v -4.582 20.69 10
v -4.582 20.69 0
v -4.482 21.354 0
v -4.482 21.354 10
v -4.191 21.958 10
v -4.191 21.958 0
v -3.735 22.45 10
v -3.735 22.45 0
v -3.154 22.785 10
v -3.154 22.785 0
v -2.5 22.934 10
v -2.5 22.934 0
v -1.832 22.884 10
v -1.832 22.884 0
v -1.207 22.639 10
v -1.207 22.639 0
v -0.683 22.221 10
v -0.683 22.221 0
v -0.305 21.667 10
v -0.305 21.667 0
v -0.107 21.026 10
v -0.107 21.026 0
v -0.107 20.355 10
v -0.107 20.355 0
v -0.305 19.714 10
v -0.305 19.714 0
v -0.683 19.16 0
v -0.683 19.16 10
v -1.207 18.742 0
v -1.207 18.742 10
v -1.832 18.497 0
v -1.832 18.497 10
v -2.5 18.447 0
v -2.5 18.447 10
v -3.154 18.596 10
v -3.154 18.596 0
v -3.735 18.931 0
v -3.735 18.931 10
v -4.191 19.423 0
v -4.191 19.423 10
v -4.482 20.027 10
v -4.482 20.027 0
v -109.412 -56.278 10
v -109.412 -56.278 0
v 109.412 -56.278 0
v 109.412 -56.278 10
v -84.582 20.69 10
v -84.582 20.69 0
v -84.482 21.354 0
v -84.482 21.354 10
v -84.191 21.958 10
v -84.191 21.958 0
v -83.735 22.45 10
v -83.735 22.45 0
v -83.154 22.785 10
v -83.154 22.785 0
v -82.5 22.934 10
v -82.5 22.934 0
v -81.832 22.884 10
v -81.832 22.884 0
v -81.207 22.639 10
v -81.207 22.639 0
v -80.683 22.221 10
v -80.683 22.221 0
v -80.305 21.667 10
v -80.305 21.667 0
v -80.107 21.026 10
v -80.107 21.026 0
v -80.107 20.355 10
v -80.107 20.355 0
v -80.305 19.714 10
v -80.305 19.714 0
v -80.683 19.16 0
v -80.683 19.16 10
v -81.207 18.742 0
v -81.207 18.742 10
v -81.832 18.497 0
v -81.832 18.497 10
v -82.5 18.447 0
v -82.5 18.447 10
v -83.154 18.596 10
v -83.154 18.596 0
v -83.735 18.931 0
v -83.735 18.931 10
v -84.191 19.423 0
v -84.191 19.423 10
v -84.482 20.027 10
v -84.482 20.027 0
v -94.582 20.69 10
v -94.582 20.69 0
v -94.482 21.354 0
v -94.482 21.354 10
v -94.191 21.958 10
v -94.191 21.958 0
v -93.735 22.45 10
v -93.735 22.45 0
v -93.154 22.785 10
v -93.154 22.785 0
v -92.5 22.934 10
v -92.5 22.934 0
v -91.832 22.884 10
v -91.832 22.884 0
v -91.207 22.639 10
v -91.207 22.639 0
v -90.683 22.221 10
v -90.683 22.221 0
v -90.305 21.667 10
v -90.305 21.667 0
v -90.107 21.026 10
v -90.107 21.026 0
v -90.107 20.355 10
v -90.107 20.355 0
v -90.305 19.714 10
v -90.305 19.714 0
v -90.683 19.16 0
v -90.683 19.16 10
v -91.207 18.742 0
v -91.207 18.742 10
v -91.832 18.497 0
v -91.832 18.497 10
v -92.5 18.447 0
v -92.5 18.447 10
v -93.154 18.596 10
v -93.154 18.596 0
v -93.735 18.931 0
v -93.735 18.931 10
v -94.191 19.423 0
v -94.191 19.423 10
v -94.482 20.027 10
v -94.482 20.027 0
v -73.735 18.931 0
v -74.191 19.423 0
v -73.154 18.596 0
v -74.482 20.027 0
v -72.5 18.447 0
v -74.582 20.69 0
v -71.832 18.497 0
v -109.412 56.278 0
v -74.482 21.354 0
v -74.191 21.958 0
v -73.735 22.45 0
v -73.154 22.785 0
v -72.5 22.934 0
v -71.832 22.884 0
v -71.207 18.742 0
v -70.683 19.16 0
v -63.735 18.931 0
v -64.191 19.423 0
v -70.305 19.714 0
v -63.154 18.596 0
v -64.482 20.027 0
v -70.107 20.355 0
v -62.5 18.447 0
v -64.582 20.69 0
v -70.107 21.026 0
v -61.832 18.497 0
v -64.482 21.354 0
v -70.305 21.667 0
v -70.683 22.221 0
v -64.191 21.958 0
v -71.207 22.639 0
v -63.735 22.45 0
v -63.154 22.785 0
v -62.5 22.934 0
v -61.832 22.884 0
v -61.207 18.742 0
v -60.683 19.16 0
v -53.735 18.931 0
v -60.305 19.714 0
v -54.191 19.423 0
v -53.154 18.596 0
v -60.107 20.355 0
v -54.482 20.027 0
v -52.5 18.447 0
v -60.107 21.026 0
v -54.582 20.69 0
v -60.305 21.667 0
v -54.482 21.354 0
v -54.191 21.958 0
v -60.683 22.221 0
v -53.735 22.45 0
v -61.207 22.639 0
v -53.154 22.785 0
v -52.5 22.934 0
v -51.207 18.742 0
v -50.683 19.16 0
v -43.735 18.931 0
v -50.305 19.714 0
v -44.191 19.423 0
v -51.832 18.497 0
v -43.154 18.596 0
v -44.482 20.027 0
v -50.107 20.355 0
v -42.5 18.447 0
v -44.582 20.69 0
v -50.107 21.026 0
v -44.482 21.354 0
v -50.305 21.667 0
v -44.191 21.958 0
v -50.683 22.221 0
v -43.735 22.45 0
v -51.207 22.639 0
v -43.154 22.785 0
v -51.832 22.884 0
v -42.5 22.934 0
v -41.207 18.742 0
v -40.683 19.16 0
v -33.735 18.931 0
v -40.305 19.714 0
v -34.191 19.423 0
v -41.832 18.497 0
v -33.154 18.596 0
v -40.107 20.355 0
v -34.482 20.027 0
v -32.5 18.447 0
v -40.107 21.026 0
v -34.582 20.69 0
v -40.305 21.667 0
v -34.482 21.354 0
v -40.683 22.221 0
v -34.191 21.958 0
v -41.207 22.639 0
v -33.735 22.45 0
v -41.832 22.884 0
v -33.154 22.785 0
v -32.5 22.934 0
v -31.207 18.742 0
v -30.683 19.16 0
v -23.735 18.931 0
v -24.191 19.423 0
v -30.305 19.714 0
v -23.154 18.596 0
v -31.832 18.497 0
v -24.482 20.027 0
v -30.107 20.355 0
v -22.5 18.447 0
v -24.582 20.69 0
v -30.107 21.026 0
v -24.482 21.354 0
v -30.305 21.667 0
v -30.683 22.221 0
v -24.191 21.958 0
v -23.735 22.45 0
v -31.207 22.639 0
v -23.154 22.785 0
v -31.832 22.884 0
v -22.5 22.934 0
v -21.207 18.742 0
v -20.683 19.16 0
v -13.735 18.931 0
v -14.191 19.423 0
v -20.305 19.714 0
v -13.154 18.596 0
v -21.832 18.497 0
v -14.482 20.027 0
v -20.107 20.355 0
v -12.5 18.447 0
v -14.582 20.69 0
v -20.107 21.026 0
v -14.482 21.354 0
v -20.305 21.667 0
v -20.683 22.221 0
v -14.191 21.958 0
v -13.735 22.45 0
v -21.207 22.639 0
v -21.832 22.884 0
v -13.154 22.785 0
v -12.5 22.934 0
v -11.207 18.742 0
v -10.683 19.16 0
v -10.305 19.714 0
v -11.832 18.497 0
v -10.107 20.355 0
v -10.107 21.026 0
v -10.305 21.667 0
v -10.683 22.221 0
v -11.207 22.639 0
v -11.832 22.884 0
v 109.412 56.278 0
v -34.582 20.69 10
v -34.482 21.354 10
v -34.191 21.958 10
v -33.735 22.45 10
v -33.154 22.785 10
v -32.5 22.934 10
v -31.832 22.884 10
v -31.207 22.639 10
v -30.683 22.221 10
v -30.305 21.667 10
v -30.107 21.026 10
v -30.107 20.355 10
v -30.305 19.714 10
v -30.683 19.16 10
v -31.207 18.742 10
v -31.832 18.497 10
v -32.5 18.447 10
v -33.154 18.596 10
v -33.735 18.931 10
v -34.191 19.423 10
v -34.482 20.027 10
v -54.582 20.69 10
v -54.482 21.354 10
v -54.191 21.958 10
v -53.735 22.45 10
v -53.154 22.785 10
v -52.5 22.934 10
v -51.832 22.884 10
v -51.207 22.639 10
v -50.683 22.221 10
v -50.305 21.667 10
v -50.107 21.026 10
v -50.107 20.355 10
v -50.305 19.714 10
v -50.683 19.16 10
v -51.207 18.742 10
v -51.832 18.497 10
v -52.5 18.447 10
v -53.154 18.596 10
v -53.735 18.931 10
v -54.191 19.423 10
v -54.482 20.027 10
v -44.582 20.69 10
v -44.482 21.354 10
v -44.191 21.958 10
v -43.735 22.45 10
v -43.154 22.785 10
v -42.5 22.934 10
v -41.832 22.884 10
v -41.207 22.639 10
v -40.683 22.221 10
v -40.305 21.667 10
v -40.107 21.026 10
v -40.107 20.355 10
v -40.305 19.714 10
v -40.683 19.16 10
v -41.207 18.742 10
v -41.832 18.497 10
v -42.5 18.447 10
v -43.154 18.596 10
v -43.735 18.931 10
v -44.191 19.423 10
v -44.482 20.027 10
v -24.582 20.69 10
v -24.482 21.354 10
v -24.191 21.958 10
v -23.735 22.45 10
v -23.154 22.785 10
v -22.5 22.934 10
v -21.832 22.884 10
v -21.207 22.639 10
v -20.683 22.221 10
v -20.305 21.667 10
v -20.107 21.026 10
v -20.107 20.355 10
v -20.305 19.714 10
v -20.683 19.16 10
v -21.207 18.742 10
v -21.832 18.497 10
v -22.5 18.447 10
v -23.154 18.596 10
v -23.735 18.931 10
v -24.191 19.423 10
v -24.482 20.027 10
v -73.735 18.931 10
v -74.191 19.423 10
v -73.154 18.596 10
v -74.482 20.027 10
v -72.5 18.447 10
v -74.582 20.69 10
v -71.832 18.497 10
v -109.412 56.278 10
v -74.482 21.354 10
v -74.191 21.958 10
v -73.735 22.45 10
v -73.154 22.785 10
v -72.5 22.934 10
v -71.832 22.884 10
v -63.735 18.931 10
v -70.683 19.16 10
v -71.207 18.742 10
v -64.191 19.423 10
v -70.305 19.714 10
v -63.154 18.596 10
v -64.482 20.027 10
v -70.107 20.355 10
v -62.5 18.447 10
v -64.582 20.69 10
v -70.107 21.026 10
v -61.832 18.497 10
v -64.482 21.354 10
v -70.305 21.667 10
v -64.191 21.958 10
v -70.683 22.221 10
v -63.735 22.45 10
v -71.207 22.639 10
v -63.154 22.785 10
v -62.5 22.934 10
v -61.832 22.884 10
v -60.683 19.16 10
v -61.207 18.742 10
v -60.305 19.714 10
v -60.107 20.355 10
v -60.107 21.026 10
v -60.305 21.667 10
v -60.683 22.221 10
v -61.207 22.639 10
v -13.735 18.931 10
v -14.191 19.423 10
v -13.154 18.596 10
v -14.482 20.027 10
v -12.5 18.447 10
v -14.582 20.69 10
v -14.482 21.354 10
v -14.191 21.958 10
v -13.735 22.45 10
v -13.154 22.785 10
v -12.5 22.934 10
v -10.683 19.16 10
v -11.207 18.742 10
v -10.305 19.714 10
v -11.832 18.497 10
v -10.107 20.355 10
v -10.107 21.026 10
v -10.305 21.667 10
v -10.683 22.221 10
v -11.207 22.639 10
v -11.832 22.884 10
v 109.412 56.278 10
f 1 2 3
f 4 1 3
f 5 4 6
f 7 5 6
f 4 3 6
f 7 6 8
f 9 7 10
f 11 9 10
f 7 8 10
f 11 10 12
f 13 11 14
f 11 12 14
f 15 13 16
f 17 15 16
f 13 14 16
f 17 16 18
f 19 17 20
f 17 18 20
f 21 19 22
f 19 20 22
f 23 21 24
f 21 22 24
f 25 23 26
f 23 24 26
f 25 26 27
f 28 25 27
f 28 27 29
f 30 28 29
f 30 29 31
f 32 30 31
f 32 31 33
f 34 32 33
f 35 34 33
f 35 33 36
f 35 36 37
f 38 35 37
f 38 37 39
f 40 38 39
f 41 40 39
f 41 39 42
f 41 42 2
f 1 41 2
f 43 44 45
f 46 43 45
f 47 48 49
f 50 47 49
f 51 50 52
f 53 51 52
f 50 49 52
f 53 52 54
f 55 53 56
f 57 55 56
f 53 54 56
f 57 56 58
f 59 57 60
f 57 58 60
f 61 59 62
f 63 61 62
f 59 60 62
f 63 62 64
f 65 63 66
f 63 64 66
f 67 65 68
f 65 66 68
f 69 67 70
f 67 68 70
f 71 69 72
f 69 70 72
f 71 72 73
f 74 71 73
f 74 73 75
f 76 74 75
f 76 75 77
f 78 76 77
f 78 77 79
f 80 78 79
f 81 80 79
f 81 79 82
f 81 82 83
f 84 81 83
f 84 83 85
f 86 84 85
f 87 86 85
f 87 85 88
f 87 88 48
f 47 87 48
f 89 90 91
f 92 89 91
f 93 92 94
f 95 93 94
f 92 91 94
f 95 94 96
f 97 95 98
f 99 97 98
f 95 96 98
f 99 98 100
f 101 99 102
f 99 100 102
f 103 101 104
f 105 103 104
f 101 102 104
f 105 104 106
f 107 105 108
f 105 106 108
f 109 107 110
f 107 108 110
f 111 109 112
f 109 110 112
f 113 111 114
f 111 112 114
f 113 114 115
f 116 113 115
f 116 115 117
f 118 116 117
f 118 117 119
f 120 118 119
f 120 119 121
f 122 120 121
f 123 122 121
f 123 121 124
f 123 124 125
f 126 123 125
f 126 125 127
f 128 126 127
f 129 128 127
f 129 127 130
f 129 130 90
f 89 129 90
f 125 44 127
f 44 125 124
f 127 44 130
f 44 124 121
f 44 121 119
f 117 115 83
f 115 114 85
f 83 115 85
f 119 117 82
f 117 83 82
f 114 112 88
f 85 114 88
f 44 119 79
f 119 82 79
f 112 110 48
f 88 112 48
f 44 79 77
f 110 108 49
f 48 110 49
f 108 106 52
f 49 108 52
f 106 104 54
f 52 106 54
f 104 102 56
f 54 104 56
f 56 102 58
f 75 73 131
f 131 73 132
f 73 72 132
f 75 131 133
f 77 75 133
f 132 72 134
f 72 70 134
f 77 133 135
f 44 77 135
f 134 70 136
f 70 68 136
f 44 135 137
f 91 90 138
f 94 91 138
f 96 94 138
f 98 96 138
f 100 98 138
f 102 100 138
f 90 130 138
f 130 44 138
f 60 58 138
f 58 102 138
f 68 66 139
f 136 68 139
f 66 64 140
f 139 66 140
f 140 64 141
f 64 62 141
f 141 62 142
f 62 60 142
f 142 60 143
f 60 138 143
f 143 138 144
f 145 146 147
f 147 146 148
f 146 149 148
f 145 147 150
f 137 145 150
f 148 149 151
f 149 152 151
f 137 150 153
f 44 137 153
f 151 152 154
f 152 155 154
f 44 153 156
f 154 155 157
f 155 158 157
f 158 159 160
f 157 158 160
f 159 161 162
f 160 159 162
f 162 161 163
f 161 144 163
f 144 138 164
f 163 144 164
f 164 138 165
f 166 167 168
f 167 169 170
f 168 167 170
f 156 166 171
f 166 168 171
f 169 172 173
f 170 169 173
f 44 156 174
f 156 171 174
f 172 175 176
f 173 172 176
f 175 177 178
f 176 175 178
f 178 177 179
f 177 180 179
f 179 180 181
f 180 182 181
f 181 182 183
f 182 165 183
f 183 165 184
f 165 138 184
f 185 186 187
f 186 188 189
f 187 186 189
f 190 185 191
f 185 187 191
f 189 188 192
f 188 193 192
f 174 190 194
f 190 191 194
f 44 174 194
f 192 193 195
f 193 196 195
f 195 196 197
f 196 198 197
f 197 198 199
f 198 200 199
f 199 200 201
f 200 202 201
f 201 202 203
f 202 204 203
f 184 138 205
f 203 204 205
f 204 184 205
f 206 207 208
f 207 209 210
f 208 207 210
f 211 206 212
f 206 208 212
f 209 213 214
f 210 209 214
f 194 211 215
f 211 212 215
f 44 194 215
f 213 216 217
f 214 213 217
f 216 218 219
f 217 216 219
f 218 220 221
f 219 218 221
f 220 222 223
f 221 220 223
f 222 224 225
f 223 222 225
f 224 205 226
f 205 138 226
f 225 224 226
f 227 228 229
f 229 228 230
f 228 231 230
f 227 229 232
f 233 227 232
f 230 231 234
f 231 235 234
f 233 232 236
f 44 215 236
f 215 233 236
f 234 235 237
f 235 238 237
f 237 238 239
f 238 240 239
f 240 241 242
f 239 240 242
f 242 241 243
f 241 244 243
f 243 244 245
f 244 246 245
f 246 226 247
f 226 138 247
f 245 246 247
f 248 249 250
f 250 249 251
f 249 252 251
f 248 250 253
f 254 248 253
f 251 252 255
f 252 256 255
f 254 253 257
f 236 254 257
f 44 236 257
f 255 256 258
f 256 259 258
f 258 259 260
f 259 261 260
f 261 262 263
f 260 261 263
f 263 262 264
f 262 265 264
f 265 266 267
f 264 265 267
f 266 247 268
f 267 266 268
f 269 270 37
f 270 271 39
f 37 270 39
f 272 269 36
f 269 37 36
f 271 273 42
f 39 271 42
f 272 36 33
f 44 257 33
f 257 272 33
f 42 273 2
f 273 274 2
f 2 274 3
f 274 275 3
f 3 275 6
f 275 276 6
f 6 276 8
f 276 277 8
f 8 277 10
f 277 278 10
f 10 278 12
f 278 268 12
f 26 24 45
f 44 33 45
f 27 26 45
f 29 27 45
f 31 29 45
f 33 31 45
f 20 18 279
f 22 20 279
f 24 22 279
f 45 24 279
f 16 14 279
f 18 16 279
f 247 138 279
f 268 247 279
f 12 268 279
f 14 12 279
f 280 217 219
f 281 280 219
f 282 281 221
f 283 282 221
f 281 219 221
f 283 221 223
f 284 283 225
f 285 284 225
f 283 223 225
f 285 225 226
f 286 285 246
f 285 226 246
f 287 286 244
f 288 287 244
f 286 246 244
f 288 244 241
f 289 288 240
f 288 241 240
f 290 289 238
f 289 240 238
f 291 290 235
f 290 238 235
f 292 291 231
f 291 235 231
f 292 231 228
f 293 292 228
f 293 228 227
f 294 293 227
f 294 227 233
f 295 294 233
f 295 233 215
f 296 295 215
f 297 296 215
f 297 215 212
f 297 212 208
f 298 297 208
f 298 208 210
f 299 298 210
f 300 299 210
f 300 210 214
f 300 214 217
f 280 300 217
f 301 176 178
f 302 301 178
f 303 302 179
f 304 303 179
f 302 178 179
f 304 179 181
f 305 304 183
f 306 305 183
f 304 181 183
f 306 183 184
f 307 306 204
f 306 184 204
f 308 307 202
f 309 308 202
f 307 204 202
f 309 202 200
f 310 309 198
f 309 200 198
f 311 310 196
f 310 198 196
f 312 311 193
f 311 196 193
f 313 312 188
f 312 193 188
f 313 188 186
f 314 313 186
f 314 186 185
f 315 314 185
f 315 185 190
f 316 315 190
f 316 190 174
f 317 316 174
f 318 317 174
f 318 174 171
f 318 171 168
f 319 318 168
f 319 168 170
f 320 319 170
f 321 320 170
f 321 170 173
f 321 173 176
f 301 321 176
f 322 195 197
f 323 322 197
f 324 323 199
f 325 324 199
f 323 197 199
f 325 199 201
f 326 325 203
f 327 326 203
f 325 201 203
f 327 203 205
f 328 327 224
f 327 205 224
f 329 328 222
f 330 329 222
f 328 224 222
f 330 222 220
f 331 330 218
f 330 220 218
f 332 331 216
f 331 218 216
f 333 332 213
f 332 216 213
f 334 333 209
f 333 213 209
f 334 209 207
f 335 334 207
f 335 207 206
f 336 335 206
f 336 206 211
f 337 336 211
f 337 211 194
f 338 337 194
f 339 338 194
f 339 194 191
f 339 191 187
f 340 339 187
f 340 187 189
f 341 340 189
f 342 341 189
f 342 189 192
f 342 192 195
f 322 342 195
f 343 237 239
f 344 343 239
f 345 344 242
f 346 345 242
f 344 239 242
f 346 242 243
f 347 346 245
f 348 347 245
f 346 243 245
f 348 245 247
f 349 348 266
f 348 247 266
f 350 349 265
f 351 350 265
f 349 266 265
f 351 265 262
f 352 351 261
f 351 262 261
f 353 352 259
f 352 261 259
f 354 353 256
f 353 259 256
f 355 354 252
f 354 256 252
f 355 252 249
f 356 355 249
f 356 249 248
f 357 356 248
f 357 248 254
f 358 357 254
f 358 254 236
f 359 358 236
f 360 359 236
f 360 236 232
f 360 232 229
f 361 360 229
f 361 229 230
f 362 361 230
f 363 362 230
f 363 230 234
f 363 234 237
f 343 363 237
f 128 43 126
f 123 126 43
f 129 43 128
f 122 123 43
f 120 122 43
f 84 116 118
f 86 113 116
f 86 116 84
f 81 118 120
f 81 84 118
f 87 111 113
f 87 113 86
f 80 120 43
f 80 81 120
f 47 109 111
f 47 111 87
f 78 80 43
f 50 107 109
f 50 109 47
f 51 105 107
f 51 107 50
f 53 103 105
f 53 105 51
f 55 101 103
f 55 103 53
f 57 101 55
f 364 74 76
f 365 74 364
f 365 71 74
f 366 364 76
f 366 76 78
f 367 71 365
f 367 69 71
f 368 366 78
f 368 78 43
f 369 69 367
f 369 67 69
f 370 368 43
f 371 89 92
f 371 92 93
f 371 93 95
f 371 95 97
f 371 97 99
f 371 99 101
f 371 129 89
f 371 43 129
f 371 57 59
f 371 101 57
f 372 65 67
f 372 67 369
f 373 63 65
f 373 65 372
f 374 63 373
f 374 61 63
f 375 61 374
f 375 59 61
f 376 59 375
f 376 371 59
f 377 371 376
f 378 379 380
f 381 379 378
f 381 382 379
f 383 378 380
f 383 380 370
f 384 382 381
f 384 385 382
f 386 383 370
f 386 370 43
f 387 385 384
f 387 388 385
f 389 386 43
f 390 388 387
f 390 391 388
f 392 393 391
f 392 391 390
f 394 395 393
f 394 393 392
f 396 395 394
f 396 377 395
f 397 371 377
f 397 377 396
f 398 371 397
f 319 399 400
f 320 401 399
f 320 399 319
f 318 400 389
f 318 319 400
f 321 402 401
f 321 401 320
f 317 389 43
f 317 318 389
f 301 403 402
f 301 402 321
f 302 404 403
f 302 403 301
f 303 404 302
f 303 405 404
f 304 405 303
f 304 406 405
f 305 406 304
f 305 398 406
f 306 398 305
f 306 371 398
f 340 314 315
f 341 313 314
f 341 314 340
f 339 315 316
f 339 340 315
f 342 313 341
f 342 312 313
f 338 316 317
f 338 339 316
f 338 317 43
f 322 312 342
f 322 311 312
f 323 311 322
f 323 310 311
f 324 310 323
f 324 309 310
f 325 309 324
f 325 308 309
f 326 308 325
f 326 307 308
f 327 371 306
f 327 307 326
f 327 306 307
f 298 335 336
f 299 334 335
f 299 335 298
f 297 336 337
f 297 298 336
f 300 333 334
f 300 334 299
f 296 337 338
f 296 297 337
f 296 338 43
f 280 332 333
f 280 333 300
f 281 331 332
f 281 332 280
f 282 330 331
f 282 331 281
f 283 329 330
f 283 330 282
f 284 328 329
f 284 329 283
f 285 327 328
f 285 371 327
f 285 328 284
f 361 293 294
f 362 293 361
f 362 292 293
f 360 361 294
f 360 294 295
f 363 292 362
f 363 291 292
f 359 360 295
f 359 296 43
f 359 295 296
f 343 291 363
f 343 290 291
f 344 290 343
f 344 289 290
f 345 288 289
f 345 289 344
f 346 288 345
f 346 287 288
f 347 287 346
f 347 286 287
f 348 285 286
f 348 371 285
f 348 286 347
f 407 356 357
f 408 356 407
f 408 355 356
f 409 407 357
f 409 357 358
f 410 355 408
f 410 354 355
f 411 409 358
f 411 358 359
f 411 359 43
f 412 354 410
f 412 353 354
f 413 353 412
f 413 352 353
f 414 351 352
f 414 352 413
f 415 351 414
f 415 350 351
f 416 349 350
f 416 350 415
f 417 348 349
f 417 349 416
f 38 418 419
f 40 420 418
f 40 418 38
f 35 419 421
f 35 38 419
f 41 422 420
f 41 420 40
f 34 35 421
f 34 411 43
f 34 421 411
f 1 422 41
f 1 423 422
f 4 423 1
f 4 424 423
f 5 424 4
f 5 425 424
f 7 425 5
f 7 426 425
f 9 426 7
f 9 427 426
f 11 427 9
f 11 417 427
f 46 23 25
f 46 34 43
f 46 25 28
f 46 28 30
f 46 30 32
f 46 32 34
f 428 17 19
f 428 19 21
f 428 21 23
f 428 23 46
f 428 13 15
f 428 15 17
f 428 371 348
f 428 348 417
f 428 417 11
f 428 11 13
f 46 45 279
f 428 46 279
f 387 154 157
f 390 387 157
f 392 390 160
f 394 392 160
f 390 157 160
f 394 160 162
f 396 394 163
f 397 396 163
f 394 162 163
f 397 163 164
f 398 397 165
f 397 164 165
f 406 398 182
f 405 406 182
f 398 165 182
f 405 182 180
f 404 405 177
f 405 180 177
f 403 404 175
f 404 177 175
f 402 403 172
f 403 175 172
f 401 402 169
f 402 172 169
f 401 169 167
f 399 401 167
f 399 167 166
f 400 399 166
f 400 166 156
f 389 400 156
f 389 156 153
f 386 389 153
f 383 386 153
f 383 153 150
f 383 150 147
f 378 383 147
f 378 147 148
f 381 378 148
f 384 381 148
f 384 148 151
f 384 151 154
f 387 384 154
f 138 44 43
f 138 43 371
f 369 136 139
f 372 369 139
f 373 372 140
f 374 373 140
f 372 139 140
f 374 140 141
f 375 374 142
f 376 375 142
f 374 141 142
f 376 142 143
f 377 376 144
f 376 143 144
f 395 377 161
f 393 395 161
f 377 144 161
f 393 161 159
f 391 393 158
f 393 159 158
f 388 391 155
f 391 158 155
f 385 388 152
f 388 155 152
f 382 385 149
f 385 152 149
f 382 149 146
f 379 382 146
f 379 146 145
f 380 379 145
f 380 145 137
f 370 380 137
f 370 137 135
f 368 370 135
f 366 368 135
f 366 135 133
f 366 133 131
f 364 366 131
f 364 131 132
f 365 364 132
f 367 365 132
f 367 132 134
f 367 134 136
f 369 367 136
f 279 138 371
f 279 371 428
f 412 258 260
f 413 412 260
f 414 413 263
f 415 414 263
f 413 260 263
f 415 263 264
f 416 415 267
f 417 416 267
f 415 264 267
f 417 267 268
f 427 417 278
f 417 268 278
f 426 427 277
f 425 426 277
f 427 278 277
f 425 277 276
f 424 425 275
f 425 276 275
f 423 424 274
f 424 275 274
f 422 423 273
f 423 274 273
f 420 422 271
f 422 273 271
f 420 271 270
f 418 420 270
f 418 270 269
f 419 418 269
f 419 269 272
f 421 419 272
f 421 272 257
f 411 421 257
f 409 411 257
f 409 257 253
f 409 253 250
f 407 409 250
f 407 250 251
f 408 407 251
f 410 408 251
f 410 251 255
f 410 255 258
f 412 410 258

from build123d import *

# Parameters (mm, degrees)
ESQUISSE1_W                = 218.82438545
ESQUISSE1_H                = 112.55663444
BOSS_EXTRU_1_DEPTH         = 10
D_GAGEMENT_M41_D           = 4.5
D_GAGEMENT_M41_DEPTH       = 10
R_P_TITION_LIN_AIRE1_COUNT = 10
R_P_TITION_LIN_AIRE1_PITCH = 10


with BuildPart() as part:
    # Esquisse1 → Boss.-Extru.1 (new body)
    with BuildSketch(Plane.XY):
        Rectangle(ESQUISSE1_W, ESQUISSE1_H)
    extrude(amount=BOSS_EXTRU_1_DEPTH)

    # Dégagement M41
    with Locations(Plane.XY.offset(10)):
        with Locations((-92.332337332, 20.690425989)):
            d_gagement_m41 = Hole(D_GAGEMENT_M41_D / 2, depth=D_GAGEMENT_M41_DEPTH)

    # Répétition linéaire1: Dégagement M41 ×10
    with Locations(*[(i * R_P_TITION_LIN_AIRE1_PITCH, 0, 0) for i in range(1, R_P_TITION_LIN_AIRE1_COUNT)]):
        add(d_gagement_m41, mode=Mode.SUBTRACT)


solid = part.part
